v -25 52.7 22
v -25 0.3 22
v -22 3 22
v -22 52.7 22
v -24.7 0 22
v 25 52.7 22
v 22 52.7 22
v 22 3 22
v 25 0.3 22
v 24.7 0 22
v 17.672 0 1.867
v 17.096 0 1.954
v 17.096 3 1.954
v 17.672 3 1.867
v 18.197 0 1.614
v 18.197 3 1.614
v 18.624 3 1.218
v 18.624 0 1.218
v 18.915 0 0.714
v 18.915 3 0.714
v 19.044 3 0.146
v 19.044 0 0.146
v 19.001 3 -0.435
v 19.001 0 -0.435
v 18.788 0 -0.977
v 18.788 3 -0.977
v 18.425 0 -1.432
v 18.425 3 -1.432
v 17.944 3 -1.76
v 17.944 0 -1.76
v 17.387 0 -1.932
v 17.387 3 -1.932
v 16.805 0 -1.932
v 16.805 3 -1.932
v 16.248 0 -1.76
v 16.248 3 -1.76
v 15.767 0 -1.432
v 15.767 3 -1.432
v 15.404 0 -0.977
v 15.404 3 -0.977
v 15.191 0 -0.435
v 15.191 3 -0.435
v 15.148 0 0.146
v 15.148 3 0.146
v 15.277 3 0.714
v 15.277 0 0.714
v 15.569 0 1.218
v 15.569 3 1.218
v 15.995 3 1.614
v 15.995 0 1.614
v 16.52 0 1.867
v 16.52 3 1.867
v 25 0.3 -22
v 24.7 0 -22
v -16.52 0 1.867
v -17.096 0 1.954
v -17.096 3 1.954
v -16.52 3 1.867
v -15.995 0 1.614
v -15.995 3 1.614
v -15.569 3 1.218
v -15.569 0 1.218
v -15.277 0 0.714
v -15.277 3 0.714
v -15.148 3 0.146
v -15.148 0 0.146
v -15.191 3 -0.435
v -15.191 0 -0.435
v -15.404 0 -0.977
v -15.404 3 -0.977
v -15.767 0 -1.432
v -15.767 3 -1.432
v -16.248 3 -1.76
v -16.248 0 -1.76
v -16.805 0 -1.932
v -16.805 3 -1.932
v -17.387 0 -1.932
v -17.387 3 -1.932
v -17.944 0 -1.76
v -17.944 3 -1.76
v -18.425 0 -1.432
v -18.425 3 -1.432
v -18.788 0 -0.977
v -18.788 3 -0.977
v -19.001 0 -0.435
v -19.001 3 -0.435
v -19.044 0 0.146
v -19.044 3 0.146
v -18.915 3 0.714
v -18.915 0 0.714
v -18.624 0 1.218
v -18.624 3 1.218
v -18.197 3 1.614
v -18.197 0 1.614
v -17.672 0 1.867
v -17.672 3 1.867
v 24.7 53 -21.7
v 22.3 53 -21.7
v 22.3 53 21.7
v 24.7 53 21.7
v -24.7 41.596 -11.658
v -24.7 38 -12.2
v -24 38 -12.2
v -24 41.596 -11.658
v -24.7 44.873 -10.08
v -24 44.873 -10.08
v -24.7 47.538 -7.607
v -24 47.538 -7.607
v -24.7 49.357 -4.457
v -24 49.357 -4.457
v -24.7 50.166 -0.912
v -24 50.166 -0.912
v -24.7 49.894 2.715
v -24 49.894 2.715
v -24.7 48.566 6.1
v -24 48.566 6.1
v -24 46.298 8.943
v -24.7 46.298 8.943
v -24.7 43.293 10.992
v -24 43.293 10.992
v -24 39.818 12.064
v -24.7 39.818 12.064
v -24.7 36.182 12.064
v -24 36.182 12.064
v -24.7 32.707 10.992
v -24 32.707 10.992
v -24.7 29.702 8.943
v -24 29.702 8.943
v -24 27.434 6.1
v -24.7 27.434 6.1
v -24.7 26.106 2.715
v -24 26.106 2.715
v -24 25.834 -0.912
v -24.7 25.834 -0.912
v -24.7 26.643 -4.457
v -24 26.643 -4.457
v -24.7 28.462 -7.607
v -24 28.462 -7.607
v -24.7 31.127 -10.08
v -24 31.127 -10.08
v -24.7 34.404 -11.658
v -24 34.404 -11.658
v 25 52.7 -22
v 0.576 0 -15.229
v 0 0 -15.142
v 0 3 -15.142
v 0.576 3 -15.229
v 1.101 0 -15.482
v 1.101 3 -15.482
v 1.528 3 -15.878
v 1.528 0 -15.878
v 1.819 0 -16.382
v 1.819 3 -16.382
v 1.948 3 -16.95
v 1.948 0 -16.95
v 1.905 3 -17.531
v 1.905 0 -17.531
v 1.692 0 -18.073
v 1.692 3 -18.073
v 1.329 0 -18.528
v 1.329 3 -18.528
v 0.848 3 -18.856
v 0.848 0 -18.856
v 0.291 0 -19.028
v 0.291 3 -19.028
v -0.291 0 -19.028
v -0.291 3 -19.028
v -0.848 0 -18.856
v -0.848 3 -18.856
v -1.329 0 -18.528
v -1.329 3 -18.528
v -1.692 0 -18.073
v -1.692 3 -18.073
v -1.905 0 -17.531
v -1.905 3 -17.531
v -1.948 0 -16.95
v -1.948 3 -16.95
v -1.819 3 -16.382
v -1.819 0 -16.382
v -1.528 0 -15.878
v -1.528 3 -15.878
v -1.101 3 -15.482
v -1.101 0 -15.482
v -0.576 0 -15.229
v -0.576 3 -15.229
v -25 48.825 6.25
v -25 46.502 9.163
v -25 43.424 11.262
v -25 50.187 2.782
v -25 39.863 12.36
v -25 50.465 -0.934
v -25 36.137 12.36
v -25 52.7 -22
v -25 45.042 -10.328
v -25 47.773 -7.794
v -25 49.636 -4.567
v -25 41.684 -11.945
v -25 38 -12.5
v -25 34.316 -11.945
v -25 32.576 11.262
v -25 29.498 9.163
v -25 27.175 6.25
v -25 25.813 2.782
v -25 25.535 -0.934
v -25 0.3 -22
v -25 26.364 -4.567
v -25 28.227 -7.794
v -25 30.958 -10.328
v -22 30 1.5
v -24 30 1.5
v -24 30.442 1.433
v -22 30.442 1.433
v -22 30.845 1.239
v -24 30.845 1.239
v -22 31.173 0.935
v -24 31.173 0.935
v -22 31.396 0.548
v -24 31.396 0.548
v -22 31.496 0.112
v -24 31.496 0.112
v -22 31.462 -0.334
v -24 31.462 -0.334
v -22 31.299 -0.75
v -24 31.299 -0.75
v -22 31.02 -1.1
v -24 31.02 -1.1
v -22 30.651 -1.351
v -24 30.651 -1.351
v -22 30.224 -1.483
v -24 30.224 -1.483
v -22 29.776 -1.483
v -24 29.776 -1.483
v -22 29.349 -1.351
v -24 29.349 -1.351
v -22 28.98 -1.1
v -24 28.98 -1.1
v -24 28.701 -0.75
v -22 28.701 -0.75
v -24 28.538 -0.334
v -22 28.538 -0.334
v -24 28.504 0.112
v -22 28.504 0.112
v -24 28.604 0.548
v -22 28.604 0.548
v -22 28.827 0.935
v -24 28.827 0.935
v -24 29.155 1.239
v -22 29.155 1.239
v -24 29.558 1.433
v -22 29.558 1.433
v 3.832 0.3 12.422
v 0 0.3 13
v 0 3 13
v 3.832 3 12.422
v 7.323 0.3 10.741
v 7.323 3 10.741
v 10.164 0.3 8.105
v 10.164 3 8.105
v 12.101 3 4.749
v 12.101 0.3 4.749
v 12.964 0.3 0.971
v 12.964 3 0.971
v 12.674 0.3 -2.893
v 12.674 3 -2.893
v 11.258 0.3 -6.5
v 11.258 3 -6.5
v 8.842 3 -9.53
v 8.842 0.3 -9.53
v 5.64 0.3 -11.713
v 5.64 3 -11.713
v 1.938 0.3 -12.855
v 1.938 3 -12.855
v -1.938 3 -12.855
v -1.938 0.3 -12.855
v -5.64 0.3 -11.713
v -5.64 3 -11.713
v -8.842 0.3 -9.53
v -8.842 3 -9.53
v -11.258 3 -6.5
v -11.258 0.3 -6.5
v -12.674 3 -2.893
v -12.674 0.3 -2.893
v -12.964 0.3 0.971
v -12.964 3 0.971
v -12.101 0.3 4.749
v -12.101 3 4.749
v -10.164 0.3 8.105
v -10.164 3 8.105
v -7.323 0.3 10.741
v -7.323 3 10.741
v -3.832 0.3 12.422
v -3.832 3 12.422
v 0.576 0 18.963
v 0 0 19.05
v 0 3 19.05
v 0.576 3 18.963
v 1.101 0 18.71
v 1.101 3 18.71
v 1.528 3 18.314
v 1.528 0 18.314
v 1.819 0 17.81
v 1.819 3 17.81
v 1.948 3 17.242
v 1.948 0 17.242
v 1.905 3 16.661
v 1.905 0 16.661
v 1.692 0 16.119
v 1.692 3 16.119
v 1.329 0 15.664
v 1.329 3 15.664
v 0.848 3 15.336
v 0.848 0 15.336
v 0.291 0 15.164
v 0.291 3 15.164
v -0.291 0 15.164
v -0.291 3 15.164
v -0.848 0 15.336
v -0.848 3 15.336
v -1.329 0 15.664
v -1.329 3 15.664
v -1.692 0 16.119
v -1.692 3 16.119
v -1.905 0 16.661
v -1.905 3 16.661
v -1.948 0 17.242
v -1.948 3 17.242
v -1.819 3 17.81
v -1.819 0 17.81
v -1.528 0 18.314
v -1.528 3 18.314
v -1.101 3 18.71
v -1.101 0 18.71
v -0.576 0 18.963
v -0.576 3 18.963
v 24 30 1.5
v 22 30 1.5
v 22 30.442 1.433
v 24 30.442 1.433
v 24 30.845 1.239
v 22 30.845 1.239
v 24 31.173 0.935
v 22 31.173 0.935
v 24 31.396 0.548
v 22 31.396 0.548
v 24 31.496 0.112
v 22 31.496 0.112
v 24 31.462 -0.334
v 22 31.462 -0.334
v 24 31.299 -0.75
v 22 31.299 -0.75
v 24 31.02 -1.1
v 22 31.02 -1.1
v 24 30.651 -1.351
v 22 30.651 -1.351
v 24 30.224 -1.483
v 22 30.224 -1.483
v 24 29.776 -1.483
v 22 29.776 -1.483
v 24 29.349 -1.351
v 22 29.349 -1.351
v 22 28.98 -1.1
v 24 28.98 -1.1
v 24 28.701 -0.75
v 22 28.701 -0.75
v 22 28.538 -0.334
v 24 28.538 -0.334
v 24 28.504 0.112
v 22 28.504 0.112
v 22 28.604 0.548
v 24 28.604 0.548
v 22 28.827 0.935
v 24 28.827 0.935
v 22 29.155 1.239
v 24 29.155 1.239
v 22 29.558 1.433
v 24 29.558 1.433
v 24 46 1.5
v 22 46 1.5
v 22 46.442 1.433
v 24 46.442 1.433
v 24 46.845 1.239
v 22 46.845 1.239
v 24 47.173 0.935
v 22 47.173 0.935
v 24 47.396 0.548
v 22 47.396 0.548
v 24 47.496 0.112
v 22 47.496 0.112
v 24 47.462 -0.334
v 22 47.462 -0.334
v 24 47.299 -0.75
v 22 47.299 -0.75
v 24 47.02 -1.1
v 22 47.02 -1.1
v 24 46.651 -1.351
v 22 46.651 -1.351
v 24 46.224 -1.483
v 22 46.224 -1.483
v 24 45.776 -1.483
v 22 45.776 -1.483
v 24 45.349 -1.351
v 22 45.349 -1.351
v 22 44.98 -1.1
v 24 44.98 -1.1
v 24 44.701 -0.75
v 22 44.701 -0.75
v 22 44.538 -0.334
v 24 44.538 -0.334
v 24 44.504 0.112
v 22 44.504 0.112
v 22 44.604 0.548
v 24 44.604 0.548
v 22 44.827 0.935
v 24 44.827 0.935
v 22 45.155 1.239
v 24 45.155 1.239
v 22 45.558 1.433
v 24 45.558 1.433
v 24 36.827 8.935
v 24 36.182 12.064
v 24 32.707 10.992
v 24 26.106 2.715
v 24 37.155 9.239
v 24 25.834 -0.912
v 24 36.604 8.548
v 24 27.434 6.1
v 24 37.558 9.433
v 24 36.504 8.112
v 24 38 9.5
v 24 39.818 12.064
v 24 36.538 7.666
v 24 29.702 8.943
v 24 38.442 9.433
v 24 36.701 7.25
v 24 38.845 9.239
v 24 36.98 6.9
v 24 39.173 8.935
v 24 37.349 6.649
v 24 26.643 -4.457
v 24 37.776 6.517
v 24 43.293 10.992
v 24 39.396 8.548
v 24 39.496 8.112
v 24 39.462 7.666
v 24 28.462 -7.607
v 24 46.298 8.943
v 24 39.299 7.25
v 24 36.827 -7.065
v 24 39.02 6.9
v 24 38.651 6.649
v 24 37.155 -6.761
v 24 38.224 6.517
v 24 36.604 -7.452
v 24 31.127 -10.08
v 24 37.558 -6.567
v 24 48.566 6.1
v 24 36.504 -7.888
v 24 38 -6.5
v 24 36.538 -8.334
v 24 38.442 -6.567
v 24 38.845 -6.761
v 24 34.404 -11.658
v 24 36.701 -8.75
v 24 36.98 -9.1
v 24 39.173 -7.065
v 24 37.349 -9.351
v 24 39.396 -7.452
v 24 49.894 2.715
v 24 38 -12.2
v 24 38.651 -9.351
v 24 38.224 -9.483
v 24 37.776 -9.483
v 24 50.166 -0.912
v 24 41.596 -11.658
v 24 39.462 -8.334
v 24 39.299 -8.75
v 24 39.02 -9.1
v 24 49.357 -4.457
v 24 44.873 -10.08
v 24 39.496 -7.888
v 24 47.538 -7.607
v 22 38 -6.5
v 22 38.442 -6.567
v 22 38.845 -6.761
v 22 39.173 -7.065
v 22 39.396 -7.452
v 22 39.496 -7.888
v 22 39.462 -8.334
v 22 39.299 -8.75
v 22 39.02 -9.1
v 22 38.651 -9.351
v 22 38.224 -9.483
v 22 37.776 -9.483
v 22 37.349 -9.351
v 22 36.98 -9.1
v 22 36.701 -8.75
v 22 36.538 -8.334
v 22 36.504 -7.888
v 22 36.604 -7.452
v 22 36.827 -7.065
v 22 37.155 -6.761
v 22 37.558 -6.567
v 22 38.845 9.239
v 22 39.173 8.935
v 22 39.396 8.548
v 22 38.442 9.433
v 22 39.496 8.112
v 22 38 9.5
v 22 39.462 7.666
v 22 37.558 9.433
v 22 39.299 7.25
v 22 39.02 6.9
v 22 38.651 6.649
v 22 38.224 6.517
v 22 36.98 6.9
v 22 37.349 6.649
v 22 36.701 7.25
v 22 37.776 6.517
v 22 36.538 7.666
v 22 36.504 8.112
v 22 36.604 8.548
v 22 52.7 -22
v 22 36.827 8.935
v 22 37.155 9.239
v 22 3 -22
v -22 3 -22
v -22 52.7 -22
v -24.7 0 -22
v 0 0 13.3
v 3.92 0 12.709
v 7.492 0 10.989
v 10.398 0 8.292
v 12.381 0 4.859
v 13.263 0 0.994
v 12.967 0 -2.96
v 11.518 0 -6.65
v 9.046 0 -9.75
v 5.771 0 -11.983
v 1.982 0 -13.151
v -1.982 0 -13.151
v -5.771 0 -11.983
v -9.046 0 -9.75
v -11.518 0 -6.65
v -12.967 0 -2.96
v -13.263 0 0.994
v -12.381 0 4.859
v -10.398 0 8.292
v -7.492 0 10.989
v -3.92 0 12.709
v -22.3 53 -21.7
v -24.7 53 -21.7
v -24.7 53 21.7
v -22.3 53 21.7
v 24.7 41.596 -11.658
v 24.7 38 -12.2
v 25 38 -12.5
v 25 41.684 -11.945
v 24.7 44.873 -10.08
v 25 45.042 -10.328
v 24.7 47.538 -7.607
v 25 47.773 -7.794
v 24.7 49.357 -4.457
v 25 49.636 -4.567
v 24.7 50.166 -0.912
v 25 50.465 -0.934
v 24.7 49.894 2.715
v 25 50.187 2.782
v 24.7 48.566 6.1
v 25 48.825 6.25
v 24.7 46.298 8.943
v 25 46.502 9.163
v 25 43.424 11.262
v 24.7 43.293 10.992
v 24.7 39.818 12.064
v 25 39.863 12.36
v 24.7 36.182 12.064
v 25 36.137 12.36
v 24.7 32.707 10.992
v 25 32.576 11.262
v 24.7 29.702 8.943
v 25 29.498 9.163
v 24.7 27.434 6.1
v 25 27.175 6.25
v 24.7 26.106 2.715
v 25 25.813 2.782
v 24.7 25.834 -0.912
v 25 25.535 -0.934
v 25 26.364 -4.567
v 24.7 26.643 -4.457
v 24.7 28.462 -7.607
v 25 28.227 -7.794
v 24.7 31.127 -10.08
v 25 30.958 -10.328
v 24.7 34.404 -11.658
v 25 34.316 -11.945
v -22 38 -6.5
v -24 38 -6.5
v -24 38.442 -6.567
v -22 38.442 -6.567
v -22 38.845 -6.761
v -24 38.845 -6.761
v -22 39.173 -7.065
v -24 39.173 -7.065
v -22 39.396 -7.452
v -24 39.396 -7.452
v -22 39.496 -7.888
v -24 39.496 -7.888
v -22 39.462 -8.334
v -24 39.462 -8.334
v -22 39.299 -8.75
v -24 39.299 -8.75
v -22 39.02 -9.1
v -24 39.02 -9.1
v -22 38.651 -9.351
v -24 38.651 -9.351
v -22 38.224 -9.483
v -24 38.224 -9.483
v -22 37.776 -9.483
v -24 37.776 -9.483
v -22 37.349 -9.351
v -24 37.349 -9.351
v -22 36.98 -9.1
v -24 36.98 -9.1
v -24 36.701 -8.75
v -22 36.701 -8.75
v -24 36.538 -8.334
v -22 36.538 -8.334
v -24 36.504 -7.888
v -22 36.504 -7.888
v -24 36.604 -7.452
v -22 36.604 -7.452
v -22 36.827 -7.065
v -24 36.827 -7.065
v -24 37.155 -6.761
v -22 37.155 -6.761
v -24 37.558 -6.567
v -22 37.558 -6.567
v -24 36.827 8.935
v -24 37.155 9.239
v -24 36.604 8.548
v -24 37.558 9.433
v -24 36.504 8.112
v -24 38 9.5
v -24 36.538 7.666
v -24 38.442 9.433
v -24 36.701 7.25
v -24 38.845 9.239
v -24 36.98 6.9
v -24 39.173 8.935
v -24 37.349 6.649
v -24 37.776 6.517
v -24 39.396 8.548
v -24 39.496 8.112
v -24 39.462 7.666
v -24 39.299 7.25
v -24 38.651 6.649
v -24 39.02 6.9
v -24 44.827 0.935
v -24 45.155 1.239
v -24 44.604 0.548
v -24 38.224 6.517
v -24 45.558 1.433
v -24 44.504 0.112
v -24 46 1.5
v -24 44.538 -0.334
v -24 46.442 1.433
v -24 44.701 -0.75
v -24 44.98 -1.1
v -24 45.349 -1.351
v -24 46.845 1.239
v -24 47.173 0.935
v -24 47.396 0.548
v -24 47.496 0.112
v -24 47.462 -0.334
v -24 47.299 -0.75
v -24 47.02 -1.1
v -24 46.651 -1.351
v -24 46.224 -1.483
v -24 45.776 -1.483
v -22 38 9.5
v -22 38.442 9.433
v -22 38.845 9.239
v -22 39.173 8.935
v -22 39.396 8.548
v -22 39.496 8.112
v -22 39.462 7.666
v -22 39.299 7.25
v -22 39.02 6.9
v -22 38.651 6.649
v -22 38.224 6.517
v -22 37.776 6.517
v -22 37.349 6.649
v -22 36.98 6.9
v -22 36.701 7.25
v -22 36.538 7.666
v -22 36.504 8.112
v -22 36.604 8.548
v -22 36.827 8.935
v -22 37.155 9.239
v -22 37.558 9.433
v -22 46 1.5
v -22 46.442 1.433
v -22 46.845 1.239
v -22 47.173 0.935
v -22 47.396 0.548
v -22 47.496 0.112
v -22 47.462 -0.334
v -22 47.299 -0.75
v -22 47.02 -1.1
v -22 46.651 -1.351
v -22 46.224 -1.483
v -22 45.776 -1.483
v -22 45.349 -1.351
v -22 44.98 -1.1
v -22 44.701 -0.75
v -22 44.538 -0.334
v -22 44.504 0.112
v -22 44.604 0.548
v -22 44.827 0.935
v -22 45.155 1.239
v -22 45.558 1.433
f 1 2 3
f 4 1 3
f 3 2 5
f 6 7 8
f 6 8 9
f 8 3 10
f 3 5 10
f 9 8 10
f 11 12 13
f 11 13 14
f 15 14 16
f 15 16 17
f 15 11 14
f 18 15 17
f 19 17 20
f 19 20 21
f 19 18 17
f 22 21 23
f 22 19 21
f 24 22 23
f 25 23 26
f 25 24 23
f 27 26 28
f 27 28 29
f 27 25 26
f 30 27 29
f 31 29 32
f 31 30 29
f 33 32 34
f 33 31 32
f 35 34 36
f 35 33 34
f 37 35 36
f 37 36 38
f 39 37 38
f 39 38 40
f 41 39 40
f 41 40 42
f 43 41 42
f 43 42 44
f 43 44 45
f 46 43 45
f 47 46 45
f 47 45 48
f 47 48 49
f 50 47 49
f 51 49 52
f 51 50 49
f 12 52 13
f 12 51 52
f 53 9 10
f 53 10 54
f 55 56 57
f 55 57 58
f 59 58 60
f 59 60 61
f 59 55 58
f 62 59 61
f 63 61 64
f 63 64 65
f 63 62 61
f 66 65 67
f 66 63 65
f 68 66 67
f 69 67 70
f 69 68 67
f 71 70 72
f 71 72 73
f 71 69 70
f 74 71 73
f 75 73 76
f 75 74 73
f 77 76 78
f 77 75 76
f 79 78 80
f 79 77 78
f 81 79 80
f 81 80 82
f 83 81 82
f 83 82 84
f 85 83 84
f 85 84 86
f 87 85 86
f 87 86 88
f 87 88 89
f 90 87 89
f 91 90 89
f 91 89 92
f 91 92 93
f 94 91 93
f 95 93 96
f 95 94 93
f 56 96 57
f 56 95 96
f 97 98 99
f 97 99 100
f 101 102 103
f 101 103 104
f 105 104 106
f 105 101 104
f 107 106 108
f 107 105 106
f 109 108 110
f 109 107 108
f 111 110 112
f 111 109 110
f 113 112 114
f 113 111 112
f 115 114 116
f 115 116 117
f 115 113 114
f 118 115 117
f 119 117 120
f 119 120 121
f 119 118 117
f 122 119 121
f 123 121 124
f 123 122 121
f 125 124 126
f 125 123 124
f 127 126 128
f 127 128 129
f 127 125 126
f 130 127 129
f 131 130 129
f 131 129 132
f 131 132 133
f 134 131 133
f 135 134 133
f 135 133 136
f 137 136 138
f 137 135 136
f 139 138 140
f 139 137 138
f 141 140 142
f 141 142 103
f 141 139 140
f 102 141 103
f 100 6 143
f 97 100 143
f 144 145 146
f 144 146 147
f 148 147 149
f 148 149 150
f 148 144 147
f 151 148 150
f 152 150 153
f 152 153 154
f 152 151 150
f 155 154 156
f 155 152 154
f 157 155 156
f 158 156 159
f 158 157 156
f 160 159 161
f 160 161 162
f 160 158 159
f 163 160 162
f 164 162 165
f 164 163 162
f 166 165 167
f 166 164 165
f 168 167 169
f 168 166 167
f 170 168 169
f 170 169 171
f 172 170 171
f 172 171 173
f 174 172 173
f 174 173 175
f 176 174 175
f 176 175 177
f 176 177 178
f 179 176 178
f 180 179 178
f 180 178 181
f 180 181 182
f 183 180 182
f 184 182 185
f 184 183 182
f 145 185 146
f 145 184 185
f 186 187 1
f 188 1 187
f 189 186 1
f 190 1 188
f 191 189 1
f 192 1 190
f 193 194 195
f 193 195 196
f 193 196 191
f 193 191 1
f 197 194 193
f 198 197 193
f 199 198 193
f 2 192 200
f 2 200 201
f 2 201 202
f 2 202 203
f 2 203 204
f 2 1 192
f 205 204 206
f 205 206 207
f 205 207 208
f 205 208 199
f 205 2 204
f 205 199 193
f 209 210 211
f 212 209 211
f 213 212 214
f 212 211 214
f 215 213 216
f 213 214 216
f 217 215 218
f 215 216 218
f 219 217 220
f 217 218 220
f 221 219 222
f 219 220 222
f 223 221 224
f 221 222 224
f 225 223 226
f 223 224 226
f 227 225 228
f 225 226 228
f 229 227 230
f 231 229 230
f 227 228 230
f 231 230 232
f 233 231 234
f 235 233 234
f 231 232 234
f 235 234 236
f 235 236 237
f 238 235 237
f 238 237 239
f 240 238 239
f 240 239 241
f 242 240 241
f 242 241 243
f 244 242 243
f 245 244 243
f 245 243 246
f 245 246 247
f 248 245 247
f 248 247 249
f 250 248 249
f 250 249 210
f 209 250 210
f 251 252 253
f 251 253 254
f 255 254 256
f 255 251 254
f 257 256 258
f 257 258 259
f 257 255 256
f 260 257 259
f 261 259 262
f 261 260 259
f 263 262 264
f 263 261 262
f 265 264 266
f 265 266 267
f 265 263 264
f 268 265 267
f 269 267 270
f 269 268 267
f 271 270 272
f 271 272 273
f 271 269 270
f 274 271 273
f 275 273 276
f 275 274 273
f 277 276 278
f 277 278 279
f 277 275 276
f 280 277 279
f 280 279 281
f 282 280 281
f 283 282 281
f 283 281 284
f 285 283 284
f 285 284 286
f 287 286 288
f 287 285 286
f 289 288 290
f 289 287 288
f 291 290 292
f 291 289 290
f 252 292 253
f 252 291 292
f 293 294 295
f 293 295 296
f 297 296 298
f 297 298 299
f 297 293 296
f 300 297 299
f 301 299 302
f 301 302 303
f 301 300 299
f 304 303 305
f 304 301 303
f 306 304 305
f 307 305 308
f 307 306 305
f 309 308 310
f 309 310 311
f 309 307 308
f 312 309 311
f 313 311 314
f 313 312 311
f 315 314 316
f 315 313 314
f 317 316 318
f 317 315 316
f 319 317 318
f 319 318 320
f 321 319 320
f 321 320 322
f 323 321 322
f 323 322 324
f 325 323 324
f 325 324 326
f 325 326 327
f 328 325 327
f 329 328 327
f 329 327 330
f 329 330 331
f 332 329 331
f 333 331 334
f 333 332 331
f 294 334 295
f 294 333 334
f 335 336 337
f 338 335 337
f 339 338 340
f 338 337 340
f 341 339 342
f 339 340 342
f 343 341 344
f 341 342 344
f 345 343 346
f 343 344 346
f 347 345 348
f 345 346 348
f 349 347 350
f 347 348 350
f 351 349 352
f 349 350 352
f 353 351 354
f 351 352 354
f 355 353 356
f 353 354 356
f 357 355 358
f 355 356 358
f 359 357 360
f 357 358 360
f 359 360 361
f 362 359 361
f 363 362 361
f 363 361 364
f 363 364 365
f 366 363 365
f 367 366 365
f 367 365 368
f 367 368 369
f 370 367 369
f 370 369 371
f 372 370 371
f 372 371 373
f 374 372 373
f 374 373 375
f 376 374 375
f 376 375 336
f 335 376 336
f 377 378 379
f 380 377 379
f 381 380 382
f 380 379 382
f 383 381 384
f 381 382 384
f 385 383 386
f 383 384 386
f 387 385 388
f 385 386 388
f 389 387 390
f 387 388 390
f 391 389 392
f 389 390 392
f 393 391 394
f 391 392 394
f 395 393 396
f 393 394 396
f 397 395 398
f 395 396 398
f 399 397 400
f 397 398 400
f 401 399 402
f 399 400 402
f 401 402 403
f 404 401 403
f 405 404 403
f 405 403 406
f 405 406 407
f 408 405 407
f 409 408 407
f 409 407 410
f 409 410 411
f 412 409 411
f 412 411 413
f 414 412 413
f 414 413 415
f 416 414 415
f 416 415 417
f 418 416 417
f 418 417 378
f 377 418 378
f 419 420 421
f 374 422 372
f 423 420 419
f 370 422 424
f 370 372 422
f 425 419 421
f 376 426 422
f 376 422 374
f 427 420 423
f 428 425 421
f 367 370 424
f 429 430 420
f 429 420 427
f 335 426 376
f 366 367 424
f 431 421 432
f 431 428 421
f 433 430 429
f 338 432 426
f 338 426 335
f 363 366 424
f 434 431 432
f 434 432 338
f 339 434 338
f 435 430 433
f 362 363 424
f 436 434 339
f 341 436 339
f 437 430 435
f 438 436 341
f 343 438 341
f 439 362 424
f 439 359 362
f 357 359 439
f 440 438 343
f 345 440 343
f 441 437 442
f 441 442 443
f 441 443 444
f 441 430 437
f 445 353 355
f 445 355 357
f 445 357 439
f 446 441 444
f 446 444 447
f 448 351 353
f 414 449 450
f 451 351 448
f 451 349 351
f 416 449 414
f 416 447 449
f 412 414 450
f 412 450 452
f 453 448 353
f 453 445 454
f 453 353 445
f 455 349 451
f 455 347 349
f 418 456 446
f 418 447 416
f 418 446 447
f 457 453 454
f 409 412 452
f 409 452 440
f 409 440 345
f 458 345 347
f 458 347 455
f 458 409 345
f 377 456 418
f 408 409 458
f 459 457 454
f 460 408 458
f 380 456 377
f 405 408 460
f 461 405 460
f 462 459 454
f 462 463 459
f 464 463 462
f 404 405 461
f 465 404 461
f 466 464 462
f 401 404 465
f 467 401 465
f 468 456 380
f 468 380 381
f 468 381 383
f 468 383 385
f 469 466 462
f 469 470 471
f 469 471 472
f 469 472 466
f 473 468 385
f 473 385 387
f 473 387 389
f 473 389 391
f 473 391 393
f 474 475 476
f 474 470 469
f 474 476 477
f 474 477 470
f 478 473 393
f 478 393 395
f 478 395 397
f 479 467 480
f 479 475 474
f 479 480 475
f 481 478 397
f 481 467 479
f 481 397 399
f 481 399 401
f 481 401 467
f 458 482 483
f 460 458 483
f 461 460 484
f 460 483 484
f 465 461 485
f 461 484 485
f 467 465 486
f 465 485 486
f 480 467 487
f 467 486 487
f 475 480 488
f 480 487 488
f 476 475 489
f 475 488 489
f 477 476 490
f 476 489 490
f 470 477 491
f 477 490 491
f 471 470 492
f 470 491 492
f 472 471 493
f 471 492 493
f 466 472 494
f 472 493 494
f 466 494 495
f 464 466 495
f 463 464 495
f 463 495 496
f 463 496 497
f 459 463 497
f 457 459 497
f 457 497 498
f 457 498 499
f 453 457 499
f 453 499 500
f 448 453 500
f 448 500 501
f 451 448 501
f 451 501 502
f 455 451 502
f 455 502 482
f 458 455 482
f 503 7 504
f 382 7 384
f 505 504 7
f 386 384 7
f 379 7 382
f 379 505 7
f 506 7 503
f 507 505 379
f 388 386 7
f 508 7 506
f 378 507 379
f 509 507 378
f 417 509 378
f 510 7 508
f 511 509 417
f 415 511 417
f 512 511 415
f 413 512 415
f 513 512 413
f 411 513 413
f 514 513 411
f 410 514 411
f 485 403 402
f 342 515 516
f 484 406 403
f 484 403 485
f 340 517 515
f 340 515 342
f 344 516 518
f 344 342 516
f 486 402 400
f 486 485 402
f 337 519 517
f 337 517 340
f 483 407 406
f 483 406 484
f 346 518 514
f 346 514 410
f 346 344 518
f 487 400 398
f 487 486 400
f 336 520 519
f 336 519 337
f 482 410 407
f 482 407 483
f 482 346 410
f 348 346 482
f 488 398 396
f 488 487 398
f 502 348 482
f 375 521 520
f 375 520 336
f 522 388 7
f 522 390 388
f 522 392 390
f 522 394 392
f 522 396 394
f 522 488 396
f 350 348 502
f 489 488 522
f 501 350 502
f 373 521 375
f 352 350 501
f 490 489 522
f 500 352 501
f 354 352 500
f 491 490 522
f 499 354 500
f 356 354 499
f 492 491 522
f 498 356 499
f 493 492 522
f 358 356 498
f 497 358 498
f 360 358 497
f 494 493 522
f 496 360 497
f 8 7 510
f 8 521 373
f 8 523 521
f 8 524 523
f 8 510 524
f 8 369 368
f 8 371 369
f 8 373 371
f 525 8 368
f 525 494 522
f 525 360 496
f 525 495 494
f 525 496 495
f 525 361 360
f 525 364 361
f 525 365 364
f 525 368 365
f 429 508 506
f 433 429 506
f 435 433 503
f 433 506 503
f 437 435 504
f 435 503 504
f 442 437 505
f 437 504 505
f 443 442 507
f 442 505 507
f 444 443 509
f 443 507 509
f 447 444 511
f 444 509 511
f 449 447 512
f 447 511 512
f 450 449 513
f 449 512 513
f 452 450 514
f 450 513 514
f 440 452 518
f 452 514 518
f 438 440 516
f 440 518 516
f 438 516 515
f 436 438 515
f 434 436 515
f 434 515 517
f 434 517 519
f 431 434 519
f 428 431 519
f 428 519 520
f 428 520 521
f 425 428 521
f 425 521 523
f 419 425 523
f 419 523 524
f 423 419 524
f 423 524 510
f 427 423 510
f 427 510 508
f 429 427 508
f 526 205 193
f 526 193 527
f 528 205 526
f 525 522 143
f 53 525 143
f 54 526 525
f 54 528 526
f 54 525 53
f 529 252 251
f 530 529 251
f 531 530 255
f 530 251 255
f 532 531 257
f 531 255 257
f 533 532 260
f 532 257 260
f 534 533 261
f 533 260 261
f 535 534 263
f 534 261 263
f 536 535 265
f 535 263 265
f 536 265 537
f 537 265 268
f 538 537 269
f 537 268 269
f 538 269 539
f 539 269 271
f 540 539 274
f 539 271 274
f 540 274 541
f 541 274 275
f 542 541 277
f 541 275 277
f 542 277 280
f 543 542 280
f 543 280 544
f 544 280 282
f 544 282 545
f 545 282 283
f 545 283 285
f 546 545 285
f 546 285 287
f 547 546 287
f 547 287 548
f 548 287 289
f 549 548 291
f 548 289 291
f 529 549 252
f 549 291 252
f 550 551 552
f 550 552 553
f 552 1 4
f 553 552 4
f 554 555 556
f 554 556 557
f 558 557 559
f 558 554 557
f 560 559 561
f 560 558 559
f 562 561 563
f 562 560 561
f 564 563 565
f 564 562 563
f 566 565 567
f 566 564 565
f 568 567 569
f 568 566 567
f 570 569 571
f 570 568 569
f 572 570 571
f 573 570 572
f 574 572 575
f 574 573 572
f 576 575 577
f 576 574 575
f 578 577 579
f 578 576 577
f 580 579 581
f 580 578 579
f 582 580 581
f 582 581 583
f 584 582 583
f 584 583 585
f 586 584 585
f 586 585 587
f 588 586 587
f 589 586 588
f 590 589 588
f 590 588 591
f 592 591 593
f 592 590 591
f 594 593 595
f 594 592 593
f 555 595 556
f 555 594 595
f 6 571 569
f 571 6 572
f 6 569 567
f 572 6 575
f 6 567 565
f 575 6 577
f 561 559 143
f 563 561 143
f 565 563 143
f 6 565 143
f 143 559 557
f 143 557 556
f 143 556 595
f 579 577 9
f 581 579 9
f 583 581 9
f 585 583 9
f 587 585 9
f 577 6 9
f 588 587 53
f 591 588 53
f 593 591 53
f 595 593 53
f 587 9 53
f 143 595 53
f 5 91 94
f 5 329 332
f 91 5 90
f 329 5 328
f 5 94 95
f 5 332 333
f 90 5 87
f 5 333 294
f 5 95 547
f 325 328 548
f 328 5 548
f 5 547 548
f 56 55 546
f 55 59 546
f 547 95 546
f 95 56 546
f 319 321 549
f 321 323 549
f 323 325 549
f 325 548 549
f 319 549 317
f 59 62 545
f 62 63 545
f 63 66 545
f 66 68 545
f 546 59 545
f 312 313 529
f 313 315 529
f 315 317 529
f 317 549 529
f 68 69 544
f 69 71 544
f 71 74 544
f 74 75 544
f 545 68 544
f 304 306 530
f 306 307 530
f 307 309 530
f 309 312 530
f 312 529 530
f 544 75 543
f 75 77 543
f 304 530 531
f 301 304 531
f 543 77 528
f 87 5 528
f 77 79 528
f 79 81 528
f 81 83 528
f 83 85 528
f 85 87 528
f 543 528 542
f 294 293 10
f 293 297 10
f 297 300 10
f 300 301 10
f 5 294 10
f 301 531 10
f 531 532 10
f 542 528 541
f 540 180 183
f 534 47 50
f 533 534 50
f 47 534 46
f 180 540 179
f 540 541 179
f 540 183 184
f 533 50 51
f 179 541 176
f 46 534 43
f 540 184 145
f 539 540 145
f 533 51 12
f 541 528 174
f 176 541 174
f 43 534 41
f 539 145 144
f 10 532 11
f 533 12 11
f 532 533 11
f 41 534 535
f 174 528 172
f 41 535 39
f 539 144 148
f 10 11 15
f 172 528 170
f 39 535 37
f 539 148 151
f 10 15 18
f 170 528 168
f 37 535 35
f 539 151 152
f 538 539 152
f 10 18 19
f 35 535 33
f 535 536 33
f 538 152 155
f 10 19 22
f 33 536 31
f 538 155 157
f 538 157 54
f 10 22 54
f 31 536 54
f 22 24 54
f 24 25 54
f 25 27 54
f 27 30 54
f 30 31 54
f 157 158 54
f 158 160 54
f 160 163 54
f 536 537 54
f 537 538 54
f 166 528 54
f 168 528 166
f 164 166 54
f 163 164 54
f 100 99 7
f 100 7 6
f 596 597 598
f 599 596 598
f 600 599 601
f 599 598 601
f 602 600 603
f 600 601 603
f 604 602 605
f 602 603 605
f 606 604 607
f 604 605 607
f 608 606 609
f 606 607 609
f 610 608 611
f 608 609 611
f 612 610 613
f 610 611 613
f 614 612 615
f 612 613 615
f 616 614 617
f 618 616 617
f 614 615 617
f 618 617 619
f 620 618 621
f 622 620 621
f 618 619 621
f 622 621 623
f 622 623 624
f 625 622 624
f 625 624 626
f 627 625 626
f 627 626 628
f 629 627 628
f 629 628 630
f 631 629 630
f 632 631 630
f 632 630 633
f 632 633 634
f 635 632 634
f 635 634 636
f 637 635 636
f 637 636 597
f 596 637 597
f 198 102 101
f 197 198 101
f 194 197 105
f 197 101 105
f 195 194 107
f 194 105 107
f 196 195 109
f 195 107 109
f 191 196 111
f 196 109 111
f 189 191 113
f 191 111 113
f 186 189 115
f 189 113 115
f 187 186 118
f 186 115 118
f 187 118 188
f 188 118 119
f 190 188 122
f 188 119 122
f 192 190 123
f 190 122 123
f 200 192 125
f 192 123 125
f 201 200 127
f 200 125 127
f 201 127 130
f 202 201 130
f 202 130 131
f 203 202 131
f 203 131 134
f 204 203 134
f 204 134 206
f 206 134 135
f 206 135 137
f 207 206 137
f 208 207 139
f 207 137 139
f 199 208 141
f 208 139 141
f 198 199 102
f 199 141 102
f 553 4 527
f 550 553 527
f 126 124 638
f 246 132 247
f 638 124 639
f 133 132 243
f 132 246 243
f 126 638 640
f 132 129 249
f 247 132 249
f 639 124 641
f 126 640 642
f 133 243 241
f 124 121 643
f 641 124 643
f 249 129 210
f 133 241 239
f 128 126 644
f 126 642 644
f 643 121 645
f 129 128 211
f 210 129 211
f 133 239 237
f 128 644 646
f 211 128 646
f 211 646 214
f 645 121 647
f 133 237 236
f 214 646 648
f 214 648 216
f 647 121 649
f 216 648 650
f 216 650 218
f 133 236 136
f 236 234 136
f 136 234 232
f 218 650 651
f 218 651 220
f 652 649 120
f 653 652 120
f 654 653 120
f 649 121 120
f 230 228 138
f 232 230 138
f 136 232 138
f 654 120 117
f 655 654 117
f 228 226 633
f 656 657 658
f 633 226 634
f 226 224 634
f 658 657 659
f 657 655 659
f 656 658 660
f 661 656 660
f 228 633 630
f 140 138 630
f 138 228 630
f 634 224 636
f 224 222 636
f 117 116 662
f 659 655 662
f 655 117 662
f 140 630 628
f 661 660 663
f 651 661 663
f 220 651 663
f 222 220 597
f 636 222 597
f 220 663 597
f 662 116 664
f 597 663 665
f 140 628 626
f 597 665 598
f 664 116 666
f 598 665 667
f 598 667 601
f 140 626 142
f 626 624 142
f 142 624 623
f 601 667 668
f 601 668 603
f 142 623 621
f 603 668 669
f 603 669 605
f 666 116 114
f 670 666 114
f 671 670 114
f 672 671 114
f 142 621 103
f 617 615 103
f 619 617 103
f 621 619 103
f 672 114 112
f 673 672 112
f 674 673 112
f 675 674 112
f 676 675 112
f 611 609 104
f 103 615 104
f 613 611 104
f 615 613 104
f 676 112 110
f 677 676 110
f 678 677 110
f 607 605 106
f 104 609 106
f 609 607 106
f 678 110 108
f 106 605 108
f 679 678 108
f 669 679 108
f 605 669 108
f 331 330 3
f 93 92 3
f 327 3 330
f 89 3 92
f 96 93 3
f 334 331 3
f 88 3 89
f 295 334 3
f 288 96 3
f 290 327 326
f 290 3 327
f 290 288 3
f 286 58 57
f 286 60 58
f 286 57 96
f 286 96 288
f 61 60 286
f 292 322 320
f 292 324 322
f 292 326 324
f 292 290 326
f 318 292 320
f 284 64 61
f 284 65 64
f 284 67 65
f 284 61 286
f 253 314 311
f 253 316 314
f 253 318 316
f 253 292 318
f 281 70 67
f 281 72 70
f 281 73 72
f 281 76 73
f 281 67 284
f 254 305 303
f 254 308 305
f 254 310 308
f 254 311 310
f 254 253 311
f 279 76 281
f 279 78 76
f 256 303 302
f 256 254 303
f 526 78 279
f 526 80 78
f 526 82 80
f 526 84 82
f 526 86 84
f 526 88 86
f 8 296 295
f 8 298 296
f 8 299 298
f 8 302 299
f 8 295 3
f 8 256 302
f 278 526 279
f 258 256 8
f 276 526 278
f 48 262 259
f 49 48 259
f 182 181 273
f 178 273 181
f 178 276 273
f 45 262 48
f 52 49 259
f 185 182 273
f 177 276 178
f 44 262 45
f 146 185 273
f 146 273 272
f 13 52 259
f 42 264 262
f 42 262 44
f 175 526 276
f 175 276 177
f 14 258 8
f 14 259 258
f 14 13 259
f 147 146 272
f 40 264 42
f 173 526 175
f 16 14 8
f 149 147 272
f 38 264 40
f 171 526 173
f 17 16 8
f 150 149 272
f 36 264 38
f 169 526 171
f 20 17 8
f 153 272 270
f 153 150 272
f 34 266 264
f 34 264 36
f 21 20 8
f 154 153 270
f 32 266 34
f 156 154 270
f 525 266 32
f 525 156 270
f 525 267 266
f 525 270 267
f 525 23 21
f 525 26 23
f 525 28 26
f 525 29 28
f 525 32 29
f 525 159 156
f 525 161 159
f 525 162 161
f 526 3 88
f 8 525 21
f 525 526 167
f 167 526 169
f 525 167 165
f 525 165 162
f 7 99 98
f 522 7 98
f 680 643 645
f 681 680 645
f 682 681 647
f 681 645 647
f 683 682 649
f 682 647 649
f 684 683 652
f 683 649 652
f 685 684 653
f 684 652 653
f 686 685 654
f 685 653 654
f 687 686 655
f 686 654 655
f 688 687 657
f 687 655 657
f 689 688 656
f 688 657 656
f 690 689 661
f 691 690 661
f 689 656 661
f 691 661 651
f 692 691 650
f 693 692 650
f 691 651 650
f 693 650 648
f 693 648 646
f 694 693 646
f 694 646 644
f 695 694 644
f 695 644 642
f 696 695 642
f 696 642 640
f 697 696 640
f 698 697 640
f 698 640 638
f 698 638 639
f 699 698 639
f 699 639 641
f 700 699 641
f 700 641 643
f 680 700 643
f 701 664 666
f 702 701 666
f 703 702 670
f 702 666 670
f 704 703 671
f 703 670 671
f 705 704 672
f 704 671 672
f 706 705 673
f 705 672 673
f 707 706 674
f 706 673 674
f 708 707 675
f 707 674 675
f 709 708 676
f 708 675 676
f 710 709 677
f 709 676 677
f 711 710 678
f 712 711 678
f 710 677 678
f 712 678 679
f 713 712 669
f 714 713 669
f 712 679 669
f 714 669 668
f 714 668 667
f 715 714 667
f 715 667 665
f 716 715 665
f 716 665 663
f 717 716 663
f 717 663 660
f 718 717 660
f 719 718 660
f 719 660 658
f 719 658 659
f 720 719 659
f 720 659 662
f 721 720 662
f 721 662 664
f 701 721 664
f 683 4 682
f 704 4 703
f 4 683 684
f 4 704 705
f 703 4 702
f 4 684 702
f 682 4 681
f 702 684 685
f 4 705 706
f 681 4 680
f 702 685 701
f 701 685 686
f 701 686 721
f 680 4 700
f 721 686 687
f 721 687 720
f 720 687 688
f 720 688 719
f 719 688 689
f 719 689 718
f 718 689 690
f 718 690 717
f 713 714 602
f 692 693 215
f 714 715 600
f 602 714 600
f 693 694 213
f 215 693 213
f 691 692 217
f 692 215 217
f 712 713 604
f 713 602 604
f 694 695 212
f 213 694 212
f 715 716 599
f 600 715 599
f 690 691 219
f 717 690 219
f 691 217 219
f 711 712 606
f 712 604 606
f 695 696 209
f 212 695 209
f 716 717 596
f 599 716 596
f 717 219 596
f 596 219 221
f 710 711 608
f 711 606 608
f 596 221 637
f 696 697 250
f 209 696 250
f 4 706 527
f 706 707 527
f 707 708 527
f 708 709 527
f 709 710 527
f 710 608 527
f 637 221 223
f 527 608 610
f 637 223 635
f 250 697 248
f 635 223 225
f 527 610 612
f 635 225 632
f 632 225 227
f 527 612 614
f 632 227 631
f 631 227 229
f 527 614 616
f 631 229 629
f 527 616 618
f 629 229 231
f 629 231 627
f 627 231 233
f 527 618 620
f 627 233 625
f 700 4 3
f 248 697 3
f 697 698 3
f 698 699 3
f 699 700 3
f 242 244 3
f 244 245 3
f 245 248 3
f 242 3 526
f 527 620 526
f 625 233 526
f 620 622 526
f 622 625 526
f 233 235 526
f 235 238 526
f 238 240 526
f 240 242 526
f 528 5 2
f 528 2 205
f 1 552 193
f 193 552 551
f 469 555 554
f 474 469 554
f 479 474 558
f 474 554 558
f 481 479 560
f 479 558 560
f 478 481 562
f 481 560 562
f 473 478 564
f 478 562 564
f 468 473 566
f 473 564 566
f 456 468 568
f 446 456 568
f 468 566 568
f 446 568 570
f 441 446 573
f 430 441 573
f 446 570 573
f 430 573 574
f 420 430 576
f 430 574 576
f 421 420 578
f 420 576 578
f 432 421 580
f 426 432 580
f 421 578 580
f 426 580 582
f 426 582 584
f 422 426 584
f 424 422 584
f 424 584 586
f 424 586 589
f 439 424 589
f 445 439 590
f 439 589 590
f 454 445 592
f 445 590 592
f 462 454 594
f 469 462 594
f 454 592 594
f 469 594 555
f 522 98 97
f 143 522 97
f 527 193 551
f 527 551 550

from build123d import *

# Parameters (mm, degrees)
SKETCH_1_W          = 50
SKETCH_1_H          = 44
SKETCH_1_R          = 1.953838975
SKETCH_1_R_2        = 13
EXTRUDE_1_DEPTH     = 3
SKETCH_2_W          = 3
SKETCH_2_H          = 44
EXTRUDE_2_DEPTH     = 50
SKETCH_3_R          = 1.5
CUT_EXTRUDE_1_DEPTH = 77.111759932
SKETCH_4_R          = 12.2
CUT_EXTRUDE_2_DEPTH = 1
CHAMFER_1_SIZE      = 0.3


with BuildPart() as part:
    # 草图1 → 凸台-拉伸1 (new body)
    with BuildSketch(Plane(origin=(0, 0, 0), x_dir=(1, 0, 0), z_dir=(0, 1, 0))):
        Rectangle(SKETCH_1_W, SKETCH_1_H)
        with Locations(Location((0, 17.096091033, 0), (0, 0, 270))):
            Circle(SKETCH_1_R, mode=Mode.SUBTRACT)
        with Locations(Location((17.096091033, 0, 0), (0, 0, 270))):
            Circle(SKETCH_1_R, mode=Mode.SUBTRACT)
        with Locations(Location((0, -17.096091033, 0), (0, 0, 270))):
            Circle(SKETCH_1_R, mode=Mode.SUBTRACT)
        with Locations(Location((-17.096091033, 0, 0), (0, 0, 270))):
            Circle(SKETCH_1_R, mode=Mode.SUBTRACT)
        with Locations(Location((0, 0, 0), (0, 0, 270))):
            Circle(SKETCH_1_R_2, mode=Mode.SUBTRACT)
    extrude(amount=EXTRUDE_1_DEPTH)

    # 草图2 → 凸台-拉伸2 (add)
    with BuildSketch(Plane(origin=(0, 3, 0), x_dir=(1, 0, 0), z_dir=(0, 1, 0))):
        with Locations((-23.5, 0)):
            Rectangle(SKETCH_2_W, SKETCH_2_H)
        with Locations((23.5, 0)):
            Rectangle(SKETCH_2_W, SKETCH_2_H)
    extrude(amount=EXTRUDE_2_DEPTH)

    # 草图3 → 切除-拉伸1 (cut, through all)
    with BuildSketch(Plane.ZY.offset(25)):
        with Locations((0, 46)):
            Circle(SKETCH_3_R)
        with Locations((8, 38)):
            Circle(SKETCH_3_R)
        with Locations((0, 30)):
            Circle(SKETCH_3_R)
        with Locations((-8, 38)):
            Circle(SKETCH_3_R)
    extrude(amount=-CUT_EXTRUDE_1_DEPTH, mode=Mode.SUBTRACT)

    # 草图4 → 切除-拉伸2 (cut)
    with BuildSketch(Plane(origin=(25, 0, 0), x_dir=(0, 0, -1), z_dir=(1, 0, 0))):
        with Locations((0, 38)):
            Circle(SKETCH_4_R)
    cut_extrude_2 = extrude(amount=-CUT_EXTRUDE_2_DEPTH, mode=Mode.SUBTRACT)

    # 镜向1: 切除-拉伸2 across plane
    add(cut_extrude_2.mirror(Plane(origin=(0, 0, 0), x_dir=(0, 0, 1), z_dir=(1, 0, 0))), mode=Mode.SUBTRACT)

    # 倒角1
    chamfer_1_edges = [part.edges().sort_by_distance(p)[0] for p in [
        (-25, 38, 12.2),
        (0, 0, -13),
        (-25, 53, 0),
        (-23.5, 53, 22),
        (-22, 53, 0),
        (-23.5, 53, -22),
        (25, 53, 0),
        (23.5, 53, -22),
        (22, 53, 0),
        (23.5, 53, 22),
        (25, 0, 0),
        (-25, 0, 0),
        (25, 38, 12.2),
    ]]
    chamfer(chamfer_1_edges, length=CHAMFER_1_SIZE)


solid = part.part
